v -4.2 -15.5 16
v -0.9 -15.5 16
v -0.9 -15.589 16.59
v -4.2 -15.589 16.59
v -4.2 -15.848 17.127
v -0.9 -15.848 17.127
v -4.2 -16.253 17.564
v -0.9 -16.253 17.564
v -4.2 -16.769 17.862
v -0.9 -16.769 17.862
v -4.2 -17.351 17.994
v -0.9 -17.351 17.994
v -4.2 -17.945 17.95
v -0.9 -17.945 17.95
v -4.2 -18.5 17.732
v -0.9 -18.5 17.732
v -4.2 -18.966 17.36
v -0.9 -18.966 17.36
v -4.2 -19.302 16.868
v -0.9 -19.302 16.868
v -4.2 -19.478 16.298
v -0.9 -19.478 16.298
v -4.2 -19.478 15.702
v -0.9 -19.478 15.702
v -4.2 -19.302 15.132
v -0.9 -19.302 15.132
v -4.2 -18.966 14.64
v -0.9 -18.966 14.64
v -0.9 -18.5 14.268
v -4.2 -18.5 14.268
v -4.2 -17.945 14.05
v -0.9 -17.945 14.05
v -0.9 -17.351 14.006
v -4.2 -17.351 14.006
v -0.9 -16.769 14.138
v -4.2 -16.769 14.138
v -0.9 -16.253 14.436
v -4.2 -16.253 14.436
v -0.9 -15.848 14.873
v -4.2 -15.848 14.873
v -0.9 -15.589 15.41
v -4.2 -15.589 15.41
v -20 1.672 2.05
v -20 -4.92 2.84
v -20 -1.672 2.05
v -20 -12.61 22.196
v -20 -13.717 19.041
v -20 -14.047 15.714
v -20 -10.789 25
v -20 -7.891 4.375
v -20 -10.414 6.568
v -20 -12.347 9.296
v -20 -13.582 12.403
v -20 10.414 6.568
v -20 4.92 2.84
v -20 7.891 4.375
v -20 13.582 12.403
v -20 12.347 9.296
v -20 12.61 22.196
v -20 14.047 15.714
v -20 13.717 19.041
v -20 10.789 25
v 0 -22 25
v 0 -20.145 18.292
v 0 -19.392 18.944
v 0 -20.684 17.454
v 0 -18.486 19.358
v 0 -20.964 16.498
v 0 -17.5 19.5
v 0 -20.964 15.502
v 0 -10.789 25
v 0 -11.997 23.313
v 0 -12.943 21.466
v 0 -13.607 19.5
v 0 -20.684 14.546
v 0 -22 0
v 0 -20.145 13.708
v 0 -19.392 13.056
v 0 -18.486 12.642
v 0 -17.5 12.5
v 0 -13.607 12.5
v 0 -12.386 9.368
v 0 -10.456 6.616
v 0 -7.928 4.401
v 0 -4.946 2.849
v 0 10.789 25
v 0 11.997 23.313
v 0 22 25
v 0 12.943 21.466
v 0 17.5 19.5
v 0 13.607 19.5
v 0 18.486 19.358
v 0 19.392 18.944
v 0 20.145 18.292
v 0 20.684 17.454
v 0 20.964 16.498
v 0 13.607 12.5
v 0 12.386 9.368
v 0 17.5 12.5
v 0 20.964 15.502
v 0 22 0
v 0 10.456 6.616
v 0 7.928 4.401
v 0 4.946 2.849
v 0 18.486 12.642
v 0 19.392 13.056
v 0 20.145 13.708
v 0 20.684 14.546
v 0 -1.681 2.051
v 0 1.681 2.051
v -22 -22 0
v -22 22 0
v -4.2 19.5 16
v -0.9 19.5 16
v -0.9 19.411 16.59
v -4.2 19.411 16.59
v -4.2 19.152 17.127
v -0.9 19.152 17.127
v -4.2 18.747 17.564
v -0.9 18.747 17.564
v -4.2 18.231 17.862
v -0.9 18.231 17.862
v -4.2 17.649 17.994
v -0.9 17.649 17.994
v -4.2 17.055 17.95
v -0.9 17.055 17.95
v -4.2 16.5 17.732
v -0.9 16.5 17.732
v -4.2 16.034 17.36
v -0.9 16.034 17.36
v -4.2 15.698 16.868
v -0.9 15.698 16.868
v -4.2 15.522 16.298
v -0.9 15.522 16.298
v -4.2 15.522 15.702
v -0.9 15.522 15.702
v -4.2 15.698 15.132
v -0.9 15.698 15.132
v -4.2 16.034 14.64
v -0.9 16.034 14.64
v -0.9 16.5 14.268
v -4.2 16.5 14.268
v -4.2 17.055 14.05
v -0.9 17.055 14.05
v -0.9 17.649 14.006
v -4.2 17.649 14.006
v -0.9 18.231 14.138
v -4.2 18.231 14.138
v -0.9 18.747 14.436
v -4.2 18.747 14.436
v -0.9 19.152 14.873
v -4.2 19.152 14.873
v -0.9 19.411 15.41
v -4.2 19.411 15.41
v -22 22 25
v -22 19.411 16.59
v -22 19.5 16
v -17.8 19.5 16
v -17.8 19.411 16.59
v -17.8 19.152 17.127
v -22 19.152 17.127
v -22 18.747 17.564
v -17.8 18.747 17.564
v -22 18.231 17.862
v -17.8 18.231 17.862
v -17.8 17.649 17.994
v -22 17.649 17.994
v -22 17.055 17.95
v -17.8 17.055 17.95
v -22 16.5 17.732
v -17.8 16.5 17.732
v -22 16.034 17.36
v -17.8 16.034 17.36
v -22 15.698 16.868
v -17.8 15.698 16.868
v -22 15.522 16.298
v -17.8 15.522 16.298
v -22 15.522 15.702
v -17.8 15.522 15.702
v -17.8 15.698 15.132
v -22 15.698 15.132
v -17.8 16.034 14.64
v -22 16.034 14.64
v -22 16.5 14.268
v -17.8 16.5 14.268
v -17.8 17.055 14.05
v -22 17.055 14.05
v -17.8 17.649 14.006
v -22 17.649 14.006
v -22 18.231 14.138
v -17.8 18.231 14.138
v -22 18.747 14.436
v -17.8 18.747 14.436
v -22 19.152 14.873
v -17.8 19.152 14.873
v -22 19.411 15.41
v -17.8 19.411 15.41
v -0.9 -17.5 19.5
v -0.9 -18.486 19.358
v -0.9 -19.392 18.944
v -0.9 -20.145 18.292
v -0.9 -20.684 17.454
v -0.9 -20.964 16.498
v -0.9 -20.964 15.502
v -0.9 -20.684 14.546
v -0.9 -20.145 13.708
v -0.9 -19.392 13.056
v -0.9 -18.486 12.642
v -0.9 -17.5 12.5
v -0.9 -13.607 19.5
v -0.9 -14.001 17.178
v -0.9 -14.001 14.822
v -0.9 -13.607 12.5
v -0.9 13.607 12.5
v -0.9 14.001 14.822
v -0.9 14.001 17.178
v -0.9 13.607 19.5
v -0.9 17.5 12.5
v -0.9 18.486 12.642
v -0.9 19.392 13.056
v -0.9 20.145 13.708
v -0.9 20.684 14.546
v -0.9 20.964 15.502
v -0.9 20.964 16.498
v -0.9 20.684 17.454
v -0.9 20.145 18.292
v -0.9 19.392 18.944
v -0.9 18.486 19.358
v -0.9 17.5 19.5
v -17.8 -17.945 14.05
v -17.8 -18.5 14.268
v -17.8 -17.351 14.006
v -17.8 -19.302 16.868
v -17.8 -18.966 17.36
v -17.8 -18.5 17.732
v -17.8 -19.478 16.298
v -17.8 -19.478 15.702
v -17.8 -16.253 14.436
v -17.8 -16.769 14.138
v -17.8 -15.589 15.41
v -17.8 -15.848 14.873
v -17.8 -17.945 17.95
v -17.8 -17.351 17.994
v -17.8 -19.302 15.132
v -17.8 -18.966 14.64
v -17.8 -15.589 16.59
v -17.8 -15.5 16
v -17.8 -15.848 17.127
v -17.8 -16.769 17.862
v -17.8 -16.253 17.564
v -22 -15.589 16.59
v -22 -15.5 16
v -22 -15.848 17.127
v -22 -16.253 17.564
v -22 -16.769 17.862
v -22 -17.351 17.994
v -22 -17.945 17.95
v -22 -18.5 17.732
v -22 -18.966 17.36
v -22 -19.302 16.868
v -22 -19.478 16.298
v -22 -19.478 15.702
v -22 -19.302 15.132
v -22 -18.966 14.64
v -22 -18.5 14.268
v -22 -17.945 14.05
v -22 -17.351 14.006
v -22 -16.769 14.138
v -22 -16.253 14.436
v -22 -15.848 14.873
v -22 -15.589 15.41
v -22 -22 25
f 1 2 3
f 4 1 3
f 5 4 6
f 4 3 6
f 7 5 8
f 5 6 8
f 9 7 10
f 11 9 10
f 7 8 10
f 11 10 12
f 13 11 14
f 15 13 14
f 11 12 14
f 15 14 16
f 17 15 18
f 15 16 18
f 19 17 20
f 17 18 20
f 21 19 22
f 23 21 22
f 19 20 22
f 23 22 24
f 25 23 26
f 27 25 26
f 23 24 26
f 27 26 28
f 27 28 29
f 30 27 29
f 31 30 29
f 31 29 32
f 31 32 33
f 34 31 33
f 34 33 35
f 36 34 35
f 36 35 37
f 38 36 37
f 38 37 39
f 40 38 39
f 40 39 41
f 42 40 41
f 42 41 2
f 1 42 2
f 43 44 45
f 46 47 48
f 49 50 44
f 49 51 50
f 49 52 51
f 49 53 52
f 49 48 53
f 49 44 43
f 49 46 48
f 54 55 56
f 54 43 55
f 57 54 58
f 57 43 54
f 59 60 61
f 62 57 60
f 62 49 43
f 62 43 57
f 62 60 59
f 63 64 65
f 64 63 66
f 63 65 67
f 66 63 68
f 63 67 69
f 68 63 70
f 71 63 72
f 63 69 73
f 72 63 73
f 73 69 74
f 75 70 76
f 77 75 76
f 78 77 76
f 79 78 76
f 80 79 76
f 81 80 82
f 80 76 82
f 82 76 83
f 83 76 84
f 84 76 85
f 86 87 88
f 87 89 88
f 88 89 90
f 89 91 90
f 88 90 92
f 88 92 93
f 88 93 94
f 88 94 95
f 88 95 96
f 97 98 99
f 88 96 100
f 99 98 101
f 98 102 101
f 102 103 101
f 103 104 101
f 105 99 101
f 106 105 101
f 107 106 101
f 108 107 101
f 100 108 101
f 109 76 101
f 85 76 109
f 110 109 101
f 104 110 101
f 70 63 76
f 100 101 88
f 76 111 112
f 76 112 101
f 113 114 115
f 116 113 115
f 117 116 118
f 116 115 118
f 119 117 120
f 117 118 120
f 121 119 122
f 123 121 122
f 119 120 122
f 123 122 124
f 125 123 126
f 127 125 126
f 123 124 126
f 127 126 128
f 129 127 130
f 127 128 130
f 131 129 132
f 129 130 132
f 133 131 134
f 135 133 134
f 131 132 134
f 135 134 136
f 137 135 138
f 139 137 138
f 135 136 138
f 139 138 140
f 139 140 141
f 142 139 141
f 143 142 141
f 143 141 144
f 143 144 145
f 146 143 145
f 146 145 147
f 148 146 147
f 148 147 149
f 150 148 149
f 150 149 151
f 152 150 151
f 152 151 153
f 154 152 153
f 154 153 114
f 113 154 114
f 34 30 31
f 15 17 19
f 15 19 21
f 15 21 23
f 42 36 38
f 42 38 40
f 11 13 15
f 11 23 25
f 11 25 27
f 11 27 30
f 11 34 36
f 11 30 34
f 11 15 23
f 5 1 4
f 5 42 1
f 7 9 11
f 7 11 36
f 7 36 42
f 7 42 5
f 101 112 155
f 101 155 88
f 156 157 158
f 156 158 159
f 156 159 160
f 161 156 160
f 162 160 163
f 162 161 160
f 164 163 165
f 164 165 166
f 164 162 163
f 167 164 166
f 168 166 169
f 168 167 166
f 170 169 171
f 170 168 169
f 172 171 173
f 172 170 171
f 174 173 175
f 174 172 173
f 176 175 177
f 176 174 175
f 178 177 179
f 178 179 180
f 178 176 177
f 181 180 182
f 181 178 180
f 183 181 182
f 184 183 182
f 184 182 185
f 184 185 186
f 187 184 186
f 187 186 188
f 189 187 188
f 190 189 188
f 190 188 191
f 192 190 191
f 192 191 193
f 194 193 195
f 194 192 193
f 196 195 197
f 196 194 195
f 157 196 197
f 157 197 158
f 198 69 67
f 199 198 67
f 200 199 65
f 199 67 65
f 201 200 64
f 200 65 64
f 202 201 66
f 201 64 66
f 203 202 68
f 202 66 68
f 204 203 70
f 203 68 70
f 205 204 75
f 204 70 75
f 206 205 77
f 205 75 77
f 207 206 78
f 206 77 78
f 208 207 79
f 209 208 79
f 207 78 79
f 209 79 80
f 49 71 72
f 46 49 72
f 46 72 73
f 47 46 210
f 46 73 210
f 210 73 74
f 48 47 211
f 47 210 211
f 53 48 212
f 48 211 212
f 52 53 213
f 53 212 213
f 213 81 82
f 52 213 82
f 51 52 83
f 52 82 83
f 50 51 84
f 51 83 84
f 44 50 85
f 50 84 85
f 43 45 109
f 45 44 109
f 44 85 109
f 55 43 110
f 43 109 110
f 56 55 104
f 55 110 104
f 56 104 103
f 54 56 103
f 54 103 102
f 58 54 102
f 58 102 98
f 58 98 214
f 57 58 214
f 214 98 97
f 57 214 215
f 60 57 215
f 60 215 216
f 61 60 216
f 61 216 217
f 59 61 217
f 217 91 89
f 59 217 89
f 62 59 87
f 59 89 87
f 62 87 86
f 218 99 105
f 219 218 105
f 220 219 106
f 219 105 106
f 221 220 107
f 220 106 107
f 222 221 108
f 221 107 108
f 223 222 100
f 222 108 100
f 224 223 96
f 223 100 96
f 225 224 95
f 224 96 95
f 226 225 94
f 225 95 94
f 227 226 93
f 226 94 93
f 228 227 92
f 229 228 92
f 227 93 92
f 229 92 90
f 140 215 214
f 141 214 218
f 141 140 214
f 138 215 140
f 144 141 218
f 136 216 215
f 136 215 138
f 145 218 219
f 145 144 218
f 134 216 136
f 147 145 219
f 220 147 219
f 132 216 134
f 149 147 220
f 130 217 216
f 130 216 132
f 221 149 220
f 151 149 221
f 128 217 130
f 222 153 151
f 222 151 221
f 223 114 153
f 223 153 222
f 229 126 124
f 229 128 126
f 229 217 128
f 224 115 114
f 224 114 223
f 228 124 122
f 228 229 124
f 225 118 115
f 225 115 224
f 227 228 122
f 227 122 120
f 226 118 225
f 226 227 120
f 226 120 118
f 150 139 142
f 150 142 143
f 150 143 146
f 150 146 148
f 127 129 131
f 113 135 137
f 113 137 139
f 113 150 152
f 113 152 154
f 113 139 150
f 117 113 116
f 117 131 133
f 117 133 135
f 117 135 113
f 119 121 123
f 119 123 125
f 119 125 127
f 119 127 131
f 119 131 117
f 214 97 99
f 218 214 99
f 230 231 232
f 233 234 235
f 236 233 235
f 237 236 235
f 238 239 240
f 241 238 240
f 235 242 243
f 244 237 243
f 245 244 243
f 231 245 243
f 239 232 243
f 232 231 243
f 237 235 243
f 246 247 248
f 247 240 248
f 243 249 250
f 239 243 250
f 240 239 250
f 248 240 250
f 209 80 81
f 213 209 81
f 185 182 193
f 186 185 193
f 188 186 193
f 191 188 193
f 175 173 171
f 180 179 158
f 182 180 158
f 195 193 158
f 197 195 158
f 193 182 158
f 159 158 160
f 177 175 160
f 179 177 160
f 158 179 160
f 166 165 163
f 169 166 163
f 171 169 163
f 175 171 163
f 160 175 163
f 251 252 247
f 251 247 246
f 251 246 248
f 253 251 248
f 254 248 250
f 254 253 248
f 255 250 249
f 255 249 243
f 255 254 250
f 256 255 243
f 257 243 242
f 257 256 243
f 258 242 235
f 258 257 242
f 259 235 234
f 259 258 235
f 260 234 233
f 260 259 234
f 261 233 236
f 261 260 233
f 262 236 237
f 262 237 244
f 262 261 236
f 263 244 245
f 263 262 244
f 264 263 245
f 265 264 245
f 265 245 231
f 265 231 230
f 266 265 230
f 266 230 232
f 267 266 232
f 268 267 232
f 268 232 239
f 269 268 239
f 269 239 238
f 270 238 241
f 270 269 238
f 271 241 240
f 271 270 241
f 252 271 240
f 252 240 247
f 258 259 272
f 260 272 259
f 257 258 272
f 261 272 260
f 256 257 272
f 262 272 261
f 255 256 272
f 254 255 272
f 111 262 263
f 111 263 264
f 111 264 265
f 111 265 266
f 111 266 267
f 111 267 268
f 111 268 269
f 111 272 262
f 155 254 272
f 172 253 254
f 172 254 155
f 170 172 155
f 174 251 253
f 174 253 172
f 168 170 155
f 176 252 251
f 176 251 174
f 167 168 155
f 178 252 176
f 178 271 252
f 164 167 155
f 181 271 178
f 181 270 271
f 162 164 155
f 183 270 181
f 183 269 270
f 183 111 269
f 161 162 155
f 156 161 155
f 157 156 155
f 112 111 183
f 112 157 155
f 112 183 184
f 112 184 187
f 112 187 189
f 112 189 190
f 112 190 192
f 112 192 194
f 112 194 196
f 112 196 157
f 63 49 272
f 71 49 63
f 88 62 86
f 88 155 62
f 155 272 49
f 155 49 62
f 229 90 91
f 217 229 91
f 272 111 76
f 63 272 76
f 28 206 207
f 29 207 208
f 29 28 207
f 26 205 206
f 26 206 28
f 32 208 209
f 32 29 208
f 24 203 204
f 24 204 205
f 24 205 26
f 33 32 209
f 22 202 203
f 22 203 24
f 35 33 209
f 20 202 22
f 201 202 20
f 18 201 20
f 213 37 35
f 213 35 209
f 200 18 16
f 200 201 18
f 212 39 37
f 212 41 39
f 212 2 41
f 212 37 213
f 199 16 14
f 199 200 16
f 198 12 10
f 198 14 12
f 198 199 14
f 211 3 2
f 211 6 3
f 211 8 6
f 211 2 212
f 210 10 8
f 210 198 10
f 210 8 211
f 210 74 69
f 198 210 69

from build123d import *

# Parameters (mm, degrees)
SKETCH_W        = 22
SKETCH_H        = 44
PAD_DEPTH       = 25
SKETCH001_R     = 14.05
POCKET_DEPTH    = 20
SKETCH002_R     = 2
POCKET001_DEPTH = 4.2
POCKET002_DEPTH = 0.9
SKETCH006_R     = 2
POCKET003_DEPTH = 4.2


with BuildPart() as part:
    # Sketch → Pad (new body)
    with BuildSketch(Plane.XY):
        with Locations((-11, 0)):
            Rectangle(SKETCH_W, SKETCH_H)
    extrude(amount=PAD_DEPTH)

    # Sketch001 → Pocket (cut)
    with BuildSketch(Plane.YZ):
        with Locations((0, 16)):
            Circle(SKETCH001_R)
    extrude(amount=-POCKET_DEPTH, mode=Mode.SUBTRACT)

    # Sketch002 → Pocket001 (cut)
    with BuildSketch(Plane.YZ):
        with Locations((-17.5, 16)):
            Circle(SKETCH002_R)
        with Locations((17.5, 16)):
            Circle(SKETCH002_R)
    extrude(amount=-POCKET001_DEPTH, mode=Mode.SUBTRACT)

    # Sketch005 → Pocket002 (cut)
    with BuildSketch(Plane.YZ):
        with BuildLine():
            ThreePointArc((-17.5, 19.5), (-21, 16), (-17.5, 12.5))
            Line((-17.5, 12.5), (17.5, 12.5))
            ThreePointArc((17.5, 12.5), (21, 16), (17.5, 19.5))
            Line((17.5, 19.5), (-17.5, 19.5))
        make_face()
    extrude(amount=-POCKET002_DEPTH, mode=Mode.SUBTRACT)

    # Sketch006 → Pocket003 (cut)
    with BuildSketch(Plane.YZ.offset(-22)):
        with Locations((-17.5, 16)):
            Circle(SKETCH006_R)
        with Locations((17.5, 16)):
            Circle(SKETCH006_R)
    extrude(amount=POCKET003_DEPTH, mode=Mode.SUBTRACT)


solid = part.part
